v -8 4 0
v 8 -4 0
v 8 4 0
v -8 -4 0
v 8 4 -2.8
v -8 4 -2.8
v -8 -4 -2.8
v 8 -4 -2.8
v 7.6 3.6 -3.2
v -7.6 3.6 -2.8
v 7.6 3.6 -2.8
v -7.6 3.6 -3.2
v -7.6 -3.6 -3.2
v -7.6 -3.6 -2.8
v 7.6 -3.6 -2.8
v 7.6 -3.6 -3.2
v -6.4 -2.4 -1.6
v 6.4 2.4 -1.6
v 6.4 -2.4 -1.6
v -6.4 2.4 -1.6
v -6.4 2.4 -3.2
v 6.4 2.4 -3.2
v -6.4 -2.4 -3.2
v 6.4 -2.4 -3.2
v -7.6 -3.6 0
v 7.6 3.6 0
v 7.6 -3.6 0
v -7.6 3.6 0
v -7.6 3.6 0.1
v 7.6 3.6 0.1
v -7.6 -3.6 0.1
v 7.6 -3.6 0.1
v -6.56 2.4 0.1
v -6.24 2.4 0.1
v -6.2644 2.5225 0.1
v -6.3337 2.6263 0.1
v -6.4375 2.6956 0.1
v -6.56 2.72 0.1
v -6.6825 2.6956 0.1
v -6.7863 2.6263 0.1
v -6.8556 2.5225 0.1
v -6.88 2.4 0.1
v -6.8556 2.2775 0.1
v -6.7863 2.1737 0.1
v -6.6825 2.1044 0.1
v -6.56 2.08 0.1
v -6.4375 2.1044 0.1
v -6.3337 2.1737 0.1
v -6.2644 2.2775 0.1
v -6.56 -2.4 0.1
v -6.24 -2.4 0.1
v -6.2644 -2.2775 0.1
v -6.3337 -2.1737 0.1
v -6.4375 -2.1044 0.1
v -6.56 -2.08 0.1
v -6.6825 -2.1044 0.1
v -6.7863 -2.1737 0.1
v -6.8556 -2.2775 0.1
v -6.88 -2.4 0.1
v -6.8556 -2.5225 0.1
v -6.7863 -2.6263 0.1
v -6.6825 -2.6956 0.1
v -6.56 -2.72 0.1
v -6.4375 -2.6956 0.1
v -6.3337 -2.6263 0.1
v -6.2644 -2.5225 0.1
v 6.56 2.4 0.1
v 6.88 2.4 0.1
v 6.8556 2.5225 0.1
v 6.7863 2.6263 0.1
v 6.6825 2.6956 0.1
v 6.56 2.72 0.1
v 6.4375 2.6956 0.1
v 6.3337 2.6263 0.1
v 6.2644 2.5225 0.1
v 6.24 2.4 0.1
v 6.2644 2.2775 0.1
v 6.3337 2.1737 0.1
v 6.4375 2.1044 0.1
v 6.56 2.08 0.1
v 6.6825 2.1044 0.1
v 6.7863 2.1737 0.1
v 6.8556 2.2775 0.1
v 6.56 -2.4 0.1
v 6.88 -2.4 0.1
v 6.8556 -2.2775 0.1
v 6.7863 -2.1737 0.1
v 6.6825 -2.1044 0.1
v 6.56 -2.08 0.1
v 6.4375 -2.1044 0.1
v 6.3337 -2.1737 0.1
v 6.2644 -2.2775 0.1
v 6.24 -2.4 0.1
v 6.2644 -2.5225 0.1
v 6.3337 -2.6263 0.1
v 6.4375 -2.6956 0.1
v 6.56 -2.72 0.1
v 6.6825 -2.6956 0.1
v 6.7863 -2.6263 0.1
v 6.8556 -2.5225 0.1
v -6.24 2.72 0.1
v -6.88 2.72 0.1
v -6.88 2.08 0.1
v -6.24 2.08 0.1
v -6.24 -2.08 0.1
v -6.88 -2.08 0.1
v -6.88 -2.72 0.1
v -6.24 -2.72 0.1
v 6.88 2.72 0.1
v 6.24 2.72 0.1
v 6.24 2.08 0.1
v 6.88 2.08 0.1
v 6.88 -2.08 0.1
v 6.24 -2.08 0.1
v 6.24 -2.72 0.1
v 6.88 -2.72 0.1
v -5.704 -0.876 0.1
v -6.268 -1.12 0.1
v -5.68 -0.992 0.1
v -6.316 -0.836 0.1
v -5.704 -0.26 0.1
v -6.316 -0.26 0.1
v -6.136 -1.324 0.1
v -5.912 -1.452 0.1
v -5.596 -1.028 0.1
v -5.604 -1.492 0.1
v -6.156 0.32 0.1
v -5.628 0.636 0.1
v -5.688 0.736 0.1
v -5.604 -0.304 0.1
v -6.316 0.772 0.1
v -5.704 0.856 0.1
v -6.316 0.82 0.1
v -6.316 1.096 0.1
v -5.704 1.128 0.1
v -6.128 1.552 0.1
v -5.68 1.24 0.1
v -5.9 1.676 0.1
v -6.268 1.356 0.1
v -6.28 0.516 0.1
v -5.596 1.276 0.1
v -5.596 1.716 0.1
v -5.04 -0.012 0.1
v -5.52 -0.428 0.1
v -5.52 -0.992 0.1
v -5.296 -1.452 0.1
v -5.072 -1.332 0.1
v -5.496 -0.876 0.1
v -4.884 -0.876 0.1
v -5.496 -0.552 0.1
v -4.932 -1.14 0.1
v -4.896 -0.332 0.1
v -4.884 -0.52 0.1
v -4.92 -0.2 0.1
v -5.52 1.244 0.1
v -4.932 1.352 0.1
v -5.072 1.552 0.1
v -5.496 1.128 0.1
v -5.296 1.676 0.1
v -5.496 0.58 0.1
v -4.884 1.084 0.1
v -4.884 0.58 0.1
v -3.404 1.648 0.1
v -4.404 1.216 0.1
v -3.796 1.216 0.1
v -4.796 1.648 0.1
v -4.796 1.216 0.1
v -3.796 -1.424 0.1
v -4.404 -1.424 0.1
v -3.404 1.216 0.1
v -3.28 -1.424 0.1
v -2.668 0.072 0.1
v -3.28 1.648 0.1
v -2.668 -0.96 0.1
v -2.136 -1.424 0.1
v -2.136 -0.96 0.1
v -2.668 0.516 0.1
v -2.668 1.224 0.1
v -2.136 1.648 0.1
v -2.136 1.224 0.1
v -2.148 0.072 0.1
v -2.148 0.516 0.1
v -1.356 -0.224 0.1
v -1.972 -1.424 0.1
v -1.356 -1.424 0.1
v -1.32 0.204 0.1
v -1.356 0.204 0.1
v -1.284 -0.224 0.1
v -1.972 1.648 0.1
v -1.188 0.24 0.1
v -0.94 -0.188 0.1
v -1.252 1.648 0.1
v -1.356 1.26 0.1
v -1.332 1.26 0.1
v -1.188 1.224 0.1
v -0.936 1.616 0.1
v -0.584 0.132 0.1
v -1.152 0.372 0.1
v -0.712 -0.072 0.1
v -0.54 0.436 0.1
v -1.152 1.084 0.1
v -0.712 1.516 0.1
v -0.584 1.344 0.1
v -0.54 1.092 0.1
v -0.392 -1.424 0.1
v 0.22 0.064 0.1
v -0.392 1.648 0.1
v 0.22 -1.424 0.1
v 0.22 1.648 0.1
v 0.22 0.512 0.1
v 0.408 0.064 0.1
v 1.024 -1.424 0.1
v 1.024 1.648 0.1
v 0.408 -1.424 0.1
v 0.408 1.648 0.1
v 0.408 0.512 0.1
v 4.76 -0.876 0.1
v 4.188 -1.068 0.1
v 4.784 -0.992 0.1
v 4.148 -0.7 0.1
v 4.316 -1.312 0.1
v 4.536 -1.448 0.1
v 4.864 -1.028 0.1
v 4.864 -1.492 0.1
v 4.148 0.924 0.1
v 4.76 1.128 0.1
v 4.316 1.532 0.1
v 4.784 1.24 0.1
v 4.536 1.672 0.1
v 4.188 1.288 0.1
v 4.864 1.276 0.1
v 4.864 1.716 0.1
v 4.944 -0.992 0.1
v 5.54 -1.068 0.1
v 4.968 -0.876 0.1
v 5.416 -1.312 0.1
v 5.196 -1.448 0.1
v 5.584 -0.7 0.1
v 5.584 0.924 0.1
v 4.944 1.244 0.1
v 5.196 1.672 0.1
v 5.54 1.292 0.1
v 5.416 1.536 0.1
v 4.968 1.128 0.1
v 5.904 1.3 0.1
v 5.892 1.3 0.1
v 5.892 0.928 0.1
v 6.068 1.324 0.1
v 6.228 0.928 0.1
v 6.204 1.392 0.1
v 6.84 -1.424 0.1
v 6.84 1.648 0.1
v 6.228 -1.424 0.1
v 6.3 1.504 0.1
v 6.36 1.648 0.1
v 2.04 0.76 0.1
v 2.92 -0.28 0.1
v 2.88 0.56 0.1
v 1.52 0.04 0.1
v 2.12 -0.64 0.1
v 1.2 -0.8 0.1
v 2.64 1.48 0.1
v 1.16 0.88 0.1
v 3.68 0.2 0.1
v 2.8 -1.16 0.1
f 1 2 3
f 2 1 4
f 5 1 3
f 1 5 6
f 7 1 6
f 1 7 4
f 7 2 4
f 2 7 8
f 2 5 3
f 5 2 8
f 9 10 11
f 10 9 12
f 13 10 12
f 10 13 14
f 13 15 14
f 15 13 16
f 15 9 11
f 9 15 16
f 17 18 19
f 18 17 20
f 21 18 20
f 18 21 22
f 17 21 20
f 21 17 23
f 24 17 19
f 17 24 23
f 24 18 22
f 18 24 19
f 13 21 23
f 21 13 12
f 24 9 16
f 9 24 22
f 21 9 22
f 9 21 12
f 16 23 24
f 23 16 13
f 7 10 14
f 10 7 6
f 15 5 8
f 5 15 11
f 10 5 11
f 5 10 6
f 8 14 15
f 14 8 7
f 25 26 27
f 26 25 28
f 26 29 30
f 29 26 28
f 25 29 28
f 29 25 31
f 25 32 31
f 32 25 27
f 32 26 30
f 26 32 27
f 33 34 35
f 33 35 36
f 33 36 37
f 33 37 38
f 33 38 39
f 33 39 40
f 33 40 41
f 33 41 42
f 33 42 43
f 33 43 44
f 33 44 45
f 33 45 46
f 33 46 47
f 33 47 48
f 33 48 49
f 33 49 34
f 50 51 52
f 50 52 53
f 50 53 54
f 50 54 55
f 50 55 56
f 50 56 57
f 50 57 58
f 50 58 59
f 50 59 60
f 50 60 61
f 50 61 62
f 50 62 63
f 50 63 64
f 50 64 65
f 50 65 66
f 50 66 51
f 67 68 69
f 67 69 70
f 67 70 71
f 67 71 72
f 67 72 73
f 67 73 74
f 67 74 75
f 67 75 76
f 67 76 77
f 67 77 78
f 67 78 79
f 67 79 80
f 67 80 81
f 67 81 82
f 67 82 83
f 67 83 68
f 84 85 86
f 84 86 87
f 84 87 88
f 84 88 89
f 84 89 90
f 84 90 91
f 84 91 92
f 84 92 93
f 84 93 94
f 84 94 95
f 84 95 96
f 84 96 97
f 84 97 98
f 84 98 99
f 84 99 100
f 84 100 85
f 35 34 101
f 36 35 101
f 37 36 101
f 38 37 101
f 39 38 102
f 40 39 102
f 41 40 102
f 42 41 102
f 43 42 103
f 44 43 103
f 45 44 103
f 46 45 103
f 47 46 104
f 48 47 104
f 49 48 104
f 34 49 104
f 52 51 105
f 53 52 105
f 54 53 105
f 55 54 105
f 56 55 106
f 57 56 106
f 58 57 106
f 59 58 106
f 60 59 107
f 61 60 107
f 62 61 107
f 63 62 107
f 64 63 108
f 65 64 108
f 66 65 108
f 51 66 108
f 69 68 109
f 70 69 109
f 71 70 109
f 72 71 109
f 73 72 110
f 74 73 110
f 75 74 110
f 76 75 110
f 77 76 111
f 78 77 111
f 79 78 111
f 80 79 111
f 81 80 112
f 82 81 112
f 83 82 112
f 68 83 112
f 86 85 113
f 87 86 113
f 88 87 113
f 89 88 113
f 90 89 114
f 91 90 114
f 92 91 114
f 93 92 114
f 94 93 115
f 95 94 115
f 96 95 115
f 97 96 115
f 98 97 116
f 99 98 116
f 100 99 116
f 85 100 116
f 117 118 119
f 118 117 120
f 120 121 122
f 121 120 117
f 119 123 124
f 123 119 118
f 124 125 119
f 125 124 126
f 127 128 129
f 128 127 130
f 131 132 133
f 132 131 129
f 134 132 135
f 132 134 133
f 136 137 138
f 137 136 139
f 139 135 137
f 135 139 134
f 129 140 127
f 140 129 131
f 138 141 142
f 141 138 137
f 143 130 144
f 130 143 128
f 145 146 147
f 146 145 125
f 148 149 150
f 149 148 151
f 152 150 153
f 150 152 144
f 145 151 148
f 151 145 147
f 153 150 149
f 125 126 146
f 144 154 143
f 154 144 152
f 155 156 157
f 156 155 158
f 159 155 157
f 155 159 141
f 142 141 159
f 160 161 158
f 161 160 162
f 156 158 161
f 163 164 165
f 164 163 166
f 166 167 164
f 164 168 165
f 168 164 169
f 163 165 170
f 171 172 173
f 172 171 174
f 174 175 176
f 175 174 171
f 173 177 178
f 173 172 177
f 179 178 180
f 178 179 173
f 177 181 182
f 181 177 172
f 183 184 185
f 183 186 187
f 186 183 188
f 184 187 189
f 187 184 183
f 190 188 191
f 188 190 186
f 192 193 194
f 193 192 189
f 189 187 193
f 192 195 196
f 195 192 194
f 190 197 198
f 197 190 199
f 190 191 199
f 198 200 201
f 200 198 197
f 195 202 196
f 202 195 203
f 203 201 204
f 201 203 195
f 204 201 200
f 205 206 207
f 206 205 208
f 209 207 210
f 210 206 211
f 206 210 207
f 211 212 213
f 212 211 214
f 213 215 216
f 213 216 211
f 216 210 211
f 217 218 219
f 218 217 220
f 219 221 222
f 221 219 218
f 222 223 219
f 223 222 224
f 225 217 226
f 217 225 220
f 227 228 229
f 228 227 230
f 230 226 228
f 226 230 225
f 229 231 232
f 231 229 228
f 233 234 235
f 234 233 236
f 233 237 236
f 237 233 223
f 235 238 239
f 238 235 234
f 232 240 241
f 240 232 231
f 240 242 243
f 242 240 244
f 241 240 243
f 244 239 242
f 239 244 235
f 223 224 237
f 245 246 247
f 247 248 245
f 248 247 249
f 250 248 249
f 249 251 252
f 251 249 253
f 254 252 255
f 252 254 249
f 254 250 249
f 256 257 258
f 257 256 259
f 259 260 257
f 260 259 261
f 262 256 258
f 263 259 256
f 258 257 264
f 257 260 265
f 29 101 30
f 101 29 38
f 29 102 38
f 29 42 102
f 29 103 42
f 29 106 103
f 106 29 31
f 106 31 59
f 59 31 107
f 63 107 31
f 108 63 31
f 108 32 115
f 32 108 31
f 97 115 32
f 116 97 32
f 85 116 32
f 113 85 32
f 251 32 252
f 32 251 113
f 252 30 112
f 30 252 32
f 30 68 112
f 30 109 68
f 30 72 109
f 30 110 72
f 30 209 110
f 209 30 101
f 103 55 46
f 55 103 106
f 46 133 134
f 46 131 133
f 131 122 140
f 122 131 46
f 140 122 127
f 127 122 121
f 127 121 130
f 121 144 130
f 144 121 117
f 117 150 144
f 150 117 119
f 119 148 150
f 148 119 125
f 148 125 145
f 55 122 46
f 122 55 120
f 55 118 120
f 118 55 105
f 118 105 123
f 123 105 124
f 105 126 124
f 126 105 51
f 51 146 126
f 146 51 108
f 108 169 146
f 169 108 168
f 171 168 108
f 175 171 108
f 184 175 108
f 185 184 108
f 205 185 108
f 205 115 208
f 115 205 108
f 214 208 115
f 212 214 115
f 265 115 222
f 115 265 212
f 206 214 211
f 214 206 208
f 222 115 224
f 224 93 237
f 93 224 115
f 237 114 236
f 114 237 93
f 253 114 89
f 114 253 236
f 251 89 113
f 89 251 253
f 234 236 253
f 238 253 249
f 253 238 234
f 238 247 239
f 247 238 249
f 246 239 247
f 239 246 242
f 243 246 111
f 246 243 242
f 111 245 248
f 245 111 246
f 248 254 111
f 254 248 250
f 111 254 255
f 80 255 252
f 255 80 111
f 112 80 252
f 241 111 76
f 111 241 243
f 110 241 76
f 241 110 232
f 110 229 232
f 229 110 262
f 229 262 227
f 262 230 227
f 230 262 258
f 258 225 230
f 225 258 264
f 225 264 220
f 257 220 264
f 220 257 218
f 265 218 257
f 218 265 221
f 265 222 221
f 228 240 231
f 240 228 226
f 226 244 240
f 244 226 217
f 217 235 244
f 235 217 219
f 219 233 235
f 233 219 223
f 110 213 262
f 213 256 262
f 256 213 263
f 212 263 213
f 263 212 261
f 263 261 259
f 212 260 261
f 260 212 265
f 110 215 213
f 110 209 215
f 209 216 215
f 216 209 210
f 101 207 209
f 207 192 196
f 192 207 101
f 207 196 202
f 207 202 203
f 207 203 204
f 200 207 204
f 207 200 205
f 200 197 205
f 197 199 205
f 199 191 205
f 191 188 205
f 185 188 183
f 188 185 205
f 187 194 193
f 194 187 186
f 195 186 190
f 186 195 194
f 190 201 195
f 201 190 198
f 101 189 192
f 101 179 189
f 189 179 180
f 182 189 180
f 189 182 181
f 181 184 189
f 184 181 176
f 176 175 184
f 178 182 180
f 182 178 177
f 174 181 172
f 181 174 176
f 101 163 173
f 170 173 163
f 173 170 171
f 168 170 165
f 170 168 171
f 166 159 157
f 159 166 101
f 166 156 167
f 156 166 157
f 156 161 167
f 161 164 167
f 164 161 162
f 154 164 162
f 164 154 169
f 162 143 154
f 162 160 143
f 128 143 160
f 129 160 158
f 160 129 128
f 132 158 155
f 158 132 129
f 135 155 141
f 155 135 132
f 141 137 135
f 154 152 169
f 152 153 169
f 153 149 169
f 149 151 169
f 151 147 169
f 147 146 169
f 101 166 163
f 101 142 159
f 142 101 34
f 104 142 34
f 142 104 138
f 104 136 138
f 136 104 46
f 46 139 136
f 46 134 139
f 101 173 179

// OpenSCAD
// file: ../p/box5.scad
use <../lib.scad>
function ldraw_lib__box5() = [
// 0 Box with 5 Faces and All Edges
// 0 Name: box5.dat
// 0 Author: James Jessiman
// 0 !LDRAW_ORG Primitive UPDATE 2012-01
// 0 !LICENSE Licensed under CC BY 4.0 : see CAreadme.txt
// 
// 0 BFC CERTIFY CCW
  [0,"BFC","CERTIFY"],
  [0,"BFC","CCW"],
// 
// 0 !HISTORY 2002-04-03 [sbliss] Modified for BFC compliance
// 0 !HISTORY 2002-04-25 [PTadmin] Official Update 2002-02
// 0 !HISTORY 2007-06-24 [PTadmin] Header formatted for Contributor Agreement
// 0 !HISTORY 2008-07-01 [PTadmin] Official Update 2008-01
// 0 !HISTORY 2012-02-16 [Philo] Changed to CCW
// 0 !HISTORY 2012-03-30 [PTadmin] Official Update 2012-01
// 
// 
// 2 24 1 1 1 -1 1 1
  [2,24,1,1,1,-1,1,1],
// 2 24 -1 1 1 -1 1 -1
  [2,24,-1,1,1,-1,1,-1],
// 2 24 -1 1 -1 1 1 -1
  [2,24,-1,1,-1,1,1,-1],
// 2 24 1 1 -1 1 1 1
  [2,24,1,1,-1,1,1,1],
// 2 24 1 0 1 -1 0 1
  [2,24,1,0,1,-1,0,1],
// 2 24 -1 0 1 -1 0 -1
  [2,24,-1,0,1,-1,0,-1],
// 2 24 -1 0 -1 1 0 -1
  [2,24,-1,0,-1,1,0,-1],
// 2 24 1 0 -1 1 0 1
  [2,24,1,0,-1,1,0,1],
// 2 24 1 0 1 1 1 1
  [2,24,1,0,1,1,1,1],
// 2 24 -1 0 1 -1 1 1
  [2,24,-1,0,1,-1,1,1],
// 2 24 1 0 -1 1 1 -1
  [2,24,1,0,-1,1,1,-1],
// 2 24 -1 0 -1 -1 1 -1
  [2,24,-1,0,-1,-1,1,-1],
// 4 16 -1 1 1 1 1 1 1 1 -1 -1 1 -1
  [4,16,-1,1,1,1,1,1,1,1,-1,-1,1,-1],
// 4 16 -1 1 1 -1 0 1 1 0 1 1 1 1
  [4,16,-1,1,1,-1,0,1,1,0,1,1,1,1],
// 4 16 -1 1 -1 -1 0 -1 -1 0 1 -1 1 1
  [4,16,-1,1,-1,-1,0,-1,-1,0,1,-1,1,1],
// 4 16 1 1 -1 1 0 -1 -1 0 -1 -1 1 -1
  [4,16,1,1,-1,1,0,-1,-1,0,-1,-1,1,-1],
// 4 16 1 1 1 1 0 1 1 0 -1 1 1 -1
  [4,16,1,1,1,1,0,1,1,0,-1,1,1,-1],
];
module ldraw_lib__box5(step=0, col=false, unit=2/5, alt=false, line=0.2, solid=!$preview)
    makepoly(ldraw_lib__box5(), step=step, col=col, unit=unit, alt=alt, line=line, solid=solid);
ldraw_lib__box5(line=0.2);
// file: ../p/box4.scad
use <../lib.scad>
function ldraw_lib__box4() = [
// 0 Box with 4 Faces (2 Parallel Pairs) and All Edges
// 0 Name: box4.dat
// 0 Author: James Jessiman
// 0 !LDRAW_ORG Primitive UPDATE 2012-01
// 0 !LICENSE Licensed under CC BY 4.0 : see CAreadme.txt
// 
// 0 BFC CERTIFY CCW
  [0,"BFC","CERTIFY"],
  [0,"BFC","CCW"],
// 
// 0 !HISTORY 2002-04-03 [sbliss] Modified for BFC compliance
// 0 !HISTORY 2002-04-25 [PTadmin] Official Update 2002-02
// 0 !HISTORY 2007-06-24 [PTadmin] Header formatted for Contributor Agreement
// 0 !HISTORY 2008-07-01 [PTadmin] Official Update 2008-01
// 0 !HISTORY 2012-02-16 [Philo] Changed to CCW
// 0 !HISTORY 2012-03-30 [PTadmin] Official Update 2012-01
// 
// 
// 2 24 1 1 1 -1 1 1
  [2,24,1,1,1,-1,1,1],
// 2 24 -1 1 1 -1 1 -1
  [2,24,-1,1,1,-1,1,-1],
// 2 24 -1 1 -1 1 1 -1
  [2,24,-1,1,-1,1,1,-1],
// 2 24 1 1 -1 1 1 1
  [2,24,1,1,-1,1,1,1],
// 2 24 1 0 1 -1 0 1
  [2,24,1,0,1,-1,0,1],
// 2 24 -1 0 1 -1 0 -1
  [2,24,-1,0,1,-1,0,-1],
// 2 24 -1 0 -1 1 0 -1
  [2,24,-1,0,-1,1,0,-1],
// 2 24 1 0 -1 1 0 1
  [2,24,1,0,-1,1,0,1],
// 2 24 1 0 1 1 1 1
  [2,24,1,0,1,1,1,1],
// 2 24 -1 0 1 -1 1 1
  [2,24,-1,0,1,-1,1,1],
// 2 24 1 0 -1 1 1 -1
  [2,24,1,0,-1,1,1,-1],
// 2 24 -1 0 -1 -1 1 -1
  [2,24,-1,0,-1,-1,1,-1],
// 4 16 -1 1 1 -1 0 1 1 0 1 1 1 1
  [4,16,-1,1,1,-1,0,1,1,0,1,1,1,1],
// 4 16 -1 1 -1 -1 0 -1 -1 0 1 -1 1 1
  [4,16,-1,1,-1,-1,0,-1,-1,0,1,-1,1,1],
// 4 16 1 1 -1 1 0 -1 -1 0 -1 -1 1 -1
  [4,16,1,1,-1,1,0,-1,-1,0,-1,-1,1,-1],
// 4 16 1 1 1 1 0 1 1 0 -1 1 1 -1
  [4,16,1,1,1,1,0,1,1,0,-1,1,1,-1],
];
module ldraw_lib__box4(step=0, col=false, unit=2/5, alt=false, line=0.2, solid=!$preview)
    makepoly(ldraw_lib__box4(), step=step, col=col, unit=unit, alt=alt, line=line, solid=solid);
ldraw_lib__box4(line=0.2);
// file: ../p/box5-12.scad
use <../lib.scad>
function ldraw_lib__box5_12() = [
// 0 Box with 5 Faces without Any Edges
// 0 Name: box5-12.dat
// 0 Author: Chris Dee [cwdee]
// 0 !LDRAW_ORG Primitive UPDATE 2009-02
// 0 !LICENSE Licensed under CC BY 4.0 : see CAreadme.txt
// 
// 0 BFC CERTIFY CCW
  [0,"BFC","CERTIFY"],
  [0,"BFC","CCW"],
// 
// 0 !HISTORY 2009-09-03 [PTadmin] Official Update 2009-02
// 
// 
// 4 16 1 1 1 1 1 -1 -1 1 -1 -1 1 1
  [4,16,1,1,1,1,1,-1,-1,1,-1,-1,1,1],
// 4 16 -1 0 1 1 0 1 1 1 1 -1 1 1
  [4,16,-1,0,1,1,0,1,1,1,1,-1,1,1],
// 4 16 -1 0 -1 -1 0 1 -1 1 1 -1 1 -1
  [4,16,-1,0,-1,-1,0,1,-1,1,1,-1,1,-1],
// 4 16 1 0 -1 -1 0 -1 -1 1 -1 1 1 -1
  [4,16,1,0,-1,-1,0,-1,-1,1,-1,1,1,-1],
// 4 16 1 0 1 1 0 -1 1 1 -1 1 1 1
  [4,16,1,0,1,1,0,-1,1,1,-1,1,1,1],
// 0
];
module ldraw_lib__box5_12(step=0, col=false, unit=2/5, alt=false, line=0.2, solid=!$preview)
    makepoly(ldraw_lib__box5_12(), step=step, col=col, unit=unit, alt=alt, line=line, solid=solid);
ldraw_lib__box5_12(line=0.2);
// file: ../p/4-4ndis.scad
use <../lib.scad>
function ldraw_lib__4_4ndis() = [
// 0 Disc Negative 1.0
// 0 Name: 4-4ndis.dat
// 0 Author: James Jessiman
// 0 !LDRAW_ORG Primitive UPDATE 2012-01
// 0 !LICENSE Licensed under CC BY 4.0 : see CAreadme.txt
// 
// 0 BFC CERTIFY CCW
  [0,"BFC","CERTIFY"],
  [0,"BFC","CCW"],
// 
// 0 !HISTORY 2002-03-23 [sbliss] Added BFC statement; compacted code
// 0 !HISTORY 2002-04-25 [PTadmin] Official Update 2002-02
// 0 !HISTORY 2007-06-24 [PTadmin] Header formatted for Contributor Agreement
// 0 !HISTORY 2008-07-01 [PTadmin] Official Update 2008-01
// 0 !HISTORY 2012-02-16 [Philo] Changed to CCW
// 0 !HISTORY 2012-03-30 [PTadmin] Official Update 2012-01
// 
// 
// 3 16 0.9239 0 0.3827 1 0 0 1 0 1
  [3,16,0.9239,0,0.3827,1,0,0,1,0,1],
// 3 16 0.7071 0 0.7071 0.9239 0 0.3827 1 0 1
  [3,16,0.7071,0,0.7071,0.9239,0,0.3827,1,0,1],
// 3 16 0.3827 0 0.9239 0.7071 0 0.7071 1 0 1
  [3,16,0.3827,0,0.9239,0.7071,0,0.7071,1,0,1],
// 3 16 0 0 1 0.3827 0 0.9239 1 0 1
  [3,16,0,0,1,0.3827,0,0.9239,1,0,1],
// 3 16 -0.3827 0 0.9239 0 0 1 -1 0 1
  [3,16,-0.3827,0,0.9239,0,0,1,-1,0,1],
// 3 16 -0.7071 0 0.7071 -0.3827 0 0.9239 -1 0 1
  [3,16,-0.7071,0,0.7071,-0.3827,0,0.9239,-1,0,1],
// 3 16 -0.9239 0 0.3827 -0.7071 0 0.7071 -1 0 1
  [3,16,-0.9239,0,0.3827,-0.7071,0,0.7071,-1,0,1],
// 3 16 -1 0 0 -0.9239 0 0.3827 -1 0 1
  [3,16,-1,0,0,-0.9239,0,0.3827,-1,0,1],
// 3 16 -0.9239 0 -0.3827 -1 0 0 -1 0 -1
  [3,16,-0.9239,0,-0.3827,-1,0,0,-1,0,-1],
// 3 16 -0.7071 0 -0.7071 -0.9239 0 -0.3827 -1 0 -1
  [3,16,-0.7071,0,-0.7071,-0.9239,0,-0.3827,-1,0,-1],
// 3 16 -0.3827 0 -0.9239 -0.7071 0 -0.7071 -1 0 -1
  [3,16,-0.3827,0,-0.9239,-0.7071,0,-0.7071,-1,0,-1],
// 3 16 0 0 -1 -0.3827 0 -0.9239 -1 0 -1
  [3,16,0,0,-1,-0.3827,0,-0.9239,-1,0,-1],
// 3 16 0.3827 0 -0.9239 0 0 -1 1 0 -1
  [3,16,0.3827,0,-0.9239,0,0,-1,1,0,-1],
// 3 16 0.7071 0 -0.7071 0.3827 0 -0.9239 1 0 -1
  [3,16,0.7071,0,-0.7071,0.3827,0,-0.9239,1,0,-1],
// 3 16 0.9239 0 -0.3827 0.7071 0 -0.7071 1 0 -1
  [3,16,0.9239,0,-0.3827,0.7071,0,-0.7071,1,0,-1],
// 3 16 1 0 0 0.9239 0 -0.3827 1 0 -1
  [3,16,1,0,0,0.9239,0,-0.3827,1,0,-1],
];
module ldraw_lib__4_4ndis(step=0, col=false, unit=2/5, alt=false, line=0.2, solid=!$preview)
    makepoly(ldraw_lib__4_4ndis(), step=step, col=col, unit=unit, alt=alt, line=line, solid=solid);
ldraw_lib__4_4ndis(line=0.2);
// file: ../p/4-4disc.scad
use <../lib.scad>
function ldraw_lib__4_4disc() = [
// 0 Disc 1.0
// 0 Name: 4-4disc.dat
// 0 Author: James Jessiman
// 0 !LDRAW_ORG Primitive UPDATE 2002-02
// 0 !LICENSE Licensed under CC BY 4.0 : see CAreadme.txt
// 
// 0 BFC CERTIFY CCW
  [0,"BFC","CERTIFY"],
  [0,"BFC","CCW"],
// 
// 0 !HISTORY 1998-12-15 [PTadmin] Official Update 1998-10
// 0 !HISTORY 2002-03-23 [sbliss] Added BFC statement
// 0 !HISTORY 2002-04-25 [PTadmin] Official Update 2002-02
// 0 !HISTORY 2007-06-24 [PTadmin] Header formatted for Contributor Agreement
// 0 !HISTORY 2008-07-01 [PTadmin] Official Update 2008-01
// 
// 
// 3 16 0 0 0 1 0 0 0.9239 0 0.3827
  [3,16,0,0,0,1,0,0,0.9239,0,0.3827],
// 3 16 0 0 0 0.9239 0 0.3827 0.7071 0 0.7071
  [3,16,0,0,0,0.9239,0,0.3827,0.7071,0,0.7071],
// 3 16 0 0 0 0.7071 0 0.7071 0.3827 0 0.9239
  [3,16,0,0,0,0.7071,0,0.7071,0.3827,0,0.9239],
// 3 16 0 0 0 0.3827 0 0.9239 0 0 1
  [3,16,0,0,0,0.3827,0,0.9239,0,0,1],
// 3 16 0 0 0 0 0 1 -0.3827 0 0.9239
  [3,16,0,0,0,0,0,1,-0.3827,0,0.9239],
// 3 16 0 0 0 -0.3827 0 0.9239 -0.7071 0 0.7071
  [3,16,0,0,0,-0.3827,0,0.9239,-0.7071,0,0.7071],
// 3 16 0 0 0 -0.7071 0 0.7071 -0.9239 0 0.3827
  [3,16,0,0,0,-0.7071,0,0.7071,-0.9239,0,0.3827],
// 3 16 0 0 0 -0.9239 0 0.3827 -1 0 -0
  [3,16,0,0,0,-0.9239,0,0.3827,-1,0,-0],
// 3 16 0 0 0 -1 0 -0 -0.9239 0 -0.3827
  [3,16,0,0,0,-1,0,-0,-0.9239,0,-0.3827],
// 3 16 0 0 0 -0.9239 0 -0.3827 -0.7071 0 -0.7071
  [3,16,0,0,0,-0.9239,0,-0.3827,-0.7071,0,-0.7071],
// 3 16 0 0 0 -0.7071 0 -0.7071 -0.3827 0 -0.9239
  [3,16,0,0,0,-0.7071,0,-0.7071,-0.3827,0,-0.9239],
// 3 16 0 0 0 -0.3827 0 -0.9239 0 0 -1
  [3,16,0,0,0,-0.3827,0,-0.9239,0,0,-1],
// 3 16 0 0 0 0 0 -1 0.3827 0 -0.9239
  [3,16,0,0,0,0,0,-1,0.3827,0,-0.9239],
// 3 16 0 0 0 0.3827 0 -0.9239 0.7071 0 -0.7071
  [3,16,0,0,0,0.3827,0,-0.9239,0.7071,0,-0.7071],
// 3 16 0 0 0 0.7071 0 -0.7071 0.9239 0 -0.3827
  [3,16,0,0,0,0.7071,0,-0.7071,0.9239,0,-0.3827],
// 3 16 0 0 0 0.9239 0 -0.3827 1 0 0
  [3,16,0,0,0,0.9239,0,-0.3827,1,0,0],
// 0
];
module ldraw_lib__4_4disc(step=0, col=false, unit=2/5, alt=false, line=0.2, solid=!$preview)
    makepoly(ldraw_lib__4_4disc(), step=step, col=col, unit=unit, alt=alt, line=line, solid=solid);
ldraw_lib__4_4disc(line=0.2);
// file: s/3069bs01.scad
use <../../lib.scad>
use <../../p/box4.scad>
use <../../p/box5.scad>
function ldraw_lib__s__3069bs01() = [
// 0 ~Tile  1 x  2 with Groove without Top Face
// 0 Name: s\3069bs01.dat
// 0 Author: Santeri Piippo [arezey]
// 0 !LDRAW_ORG Subpart UPDATE 2010-02
// 0 !LICENSE Licensed under CC BY 4.0 : see CAreadme.txt
// 
// 0 BFC CERTIFY CCW
  [0,"BFC","CERTIFY"],
  [0,"BFC","CCW"],
// 
// 0 !HISTORY 2010-07-05 [PTadmin] Official Update 2010-02
// 
// 
// 1 16 0 0 0 20 0 0 0 7 0 0 0 10 box4.dat
  [1,16,0,0,0,20,0,0,0,7,0,0,0,10, ldraw_lib__box4()],
// 1 16 0 7 0 19 0 0 0 1 0 0 0 9 box4.dat
  [1,16,0,7,0,19,0,0,0,1,0,0,0,9, ldraw_lib__box4()],
// 0 BFC INVERTNEXT
  [0,"BFC","INVERTNEXT"],
// 1 16 0 8 0 16 0 0 0 -4 0 0 0 6 box5.dat
  [1,16,0,8,0,16,0,0,0,-4,0,0,0,6, ldraw_lib__box5()],
// 4 16 -19 8 9 -16 8 6 -16 8 -6 -19 8 -9
  [4,16,-19,8,9,-16,8,6,-16,8,-6,-19,8,-9],
// 4 16 19 8 -9 16 8 -6 16 8 6 19 8 9
  [4,16,19,8,-9,16,8,-6,16,8,6,19,8,9],
// 4 16 19 8 9 16 8 6 -16 8 6 -19 8 9
  [4,16,19,8,9,16,8,6,-16,8,6,-19,8,9],
// 4 16 -19 8 -9 -16 8 -6 16 8 -6 19 8 -9
  [4,16,-19,8,-9,-16,8,-6,16,8,-6,19,8,-9],
// 4 16 -20 7 10 -19 7 9 -19 7 -9 -20 7 -10
  [4,16,-20,7,10,-19,7,9,-19,7,-9,-20,7,-10],
// 4 16 20 7 -10 19 7 -9 19 7 9 20 7 10
  [4,16,20,7,-10,19,7,-9,19,7,9,20,7,10],
// 4 16 20 7 10 19 7 9 -19 7 9 -20 7 10
  [4,16,20,7,10,19,7,9,-19,7,9,-20,7,10],
// 4 16 -20 7 -10 -19 7 -9 19 7 -9 20 7 -10
  [4,16,-20,7,-10,-19,7,-9,19,7,-9,20,7,-10],
// 0 //
];
module ldraw_lib__s__3069bs01(step=0, col=false, unit=2/5, alt=false, line=0.2, solid=!$preview)
    makepoly(ldraw_lib__s__3069bs01(), step=step, col=col, unit=unit, alt=alt, line=line, solid=solid);
ldraw_lib__s__3069bs01(line=0.2);
// file: 3069b.scad
use <../lib.scad>
use <s/3069bs01.scad>
function ldraw_lib__3069b() = [
// 0 Tile  1 x  2 with Groove
// 0 Name: 3069b.dat
// 0 Author: Santeri Piippo [arezey]
// 0 !LDRAW_ORG Part UPDATE 2010-02
// 0 !LICENSE Licensed under CC BY 4.0 : see CAreadme.txt
// 
// 0 BFC CERTIFY CCW
  [0,"BFC","CERTIFY"],
  [0,"BFC","CCW"],
// 
// 0 !HISTORY 2010-07-05 [PTadmin] Official Update 2010-02
// 
// 
// 4 16 20 0 -10 20 0 10 -20 0 10 -20 0 -10
  [4,16,20,0,-10,20,0,10,-20,0,10,-20,0,-10],
// 1 16 0 0 0 1 0 0 0 1 0 0 0 1 s\3069bs01.dat
  [1,16,0,0,0,1,0,0,0,1,0,0,0,1, ldraw_lib__s__3069bs01()],
// 0 //
];
module ldraw_lib__3069b(step=0, col=false, unit=2/5, alt=false, line=0.2, solid=!$preview)
    makepoly(ldraw_lib__3069b(), step=step, col=col, unit=unit, alt=alt, line=line, solid=solid);
ldraw_lib__3069b(line=0.2);
// main file
use <../lib.scad>
use <3069b.scad>
use <4620855c.scad>
function ldraw_lib__3069bdf1() = [
// 0 Tile  1 x  2 with Orange Star and Medium Lavender "STEPH 01" Sticker
// 0 Name: 3069bdf1.dat
// 0 Author: Takeshi Takahashi [RainbowDolphin]
// 0 !LDRAW_ORG Shortcut UPDATE 2024-08
// 0 !LICENSE Licensed under CC BY 4.0 : see CAreadme.txt
// 
// 0 BFC CERTIFY CCW
  [0,"BFC","CERTIFY"],
  [0,"BFC","CCW"],
// 
// 0 !CATEGORY Sticker Shortcut
// 0 !KEYWORDS Bricklink 3069pb0272, Convertible, Friends, License plate, Set 3183
// 
// 0 !HISTORY 2024-09-30 [OrionP] Official Update 2024-08
// 
// 1 16 0 0 0 1 0 0 0 1 0 0 0 1 3069b.dat
  [1,16,0,0,0,1,0,0,0,1,0,0,0,1, ldraw_lib__3069b()],
// 1 16 0 0 0 1 0 0 0 1 0 0 0 1 4620855c.dat
  [1,16,0,0,0,1,0,0,0,1,0,0,0,1, ldraw_lib__4620855c()],
];
module ldraw_lib__3069bdf1(step=0, col=false, unit=2/5, alt=false, line=0.2, solid=!$preview)
    makepoly(ldraw_lib__3069bdf1(), step=step, col=col, unit=unit, alt=alt, line=line, solid=solid);
ldraw_lib__3069bdf1(line=0.2);
